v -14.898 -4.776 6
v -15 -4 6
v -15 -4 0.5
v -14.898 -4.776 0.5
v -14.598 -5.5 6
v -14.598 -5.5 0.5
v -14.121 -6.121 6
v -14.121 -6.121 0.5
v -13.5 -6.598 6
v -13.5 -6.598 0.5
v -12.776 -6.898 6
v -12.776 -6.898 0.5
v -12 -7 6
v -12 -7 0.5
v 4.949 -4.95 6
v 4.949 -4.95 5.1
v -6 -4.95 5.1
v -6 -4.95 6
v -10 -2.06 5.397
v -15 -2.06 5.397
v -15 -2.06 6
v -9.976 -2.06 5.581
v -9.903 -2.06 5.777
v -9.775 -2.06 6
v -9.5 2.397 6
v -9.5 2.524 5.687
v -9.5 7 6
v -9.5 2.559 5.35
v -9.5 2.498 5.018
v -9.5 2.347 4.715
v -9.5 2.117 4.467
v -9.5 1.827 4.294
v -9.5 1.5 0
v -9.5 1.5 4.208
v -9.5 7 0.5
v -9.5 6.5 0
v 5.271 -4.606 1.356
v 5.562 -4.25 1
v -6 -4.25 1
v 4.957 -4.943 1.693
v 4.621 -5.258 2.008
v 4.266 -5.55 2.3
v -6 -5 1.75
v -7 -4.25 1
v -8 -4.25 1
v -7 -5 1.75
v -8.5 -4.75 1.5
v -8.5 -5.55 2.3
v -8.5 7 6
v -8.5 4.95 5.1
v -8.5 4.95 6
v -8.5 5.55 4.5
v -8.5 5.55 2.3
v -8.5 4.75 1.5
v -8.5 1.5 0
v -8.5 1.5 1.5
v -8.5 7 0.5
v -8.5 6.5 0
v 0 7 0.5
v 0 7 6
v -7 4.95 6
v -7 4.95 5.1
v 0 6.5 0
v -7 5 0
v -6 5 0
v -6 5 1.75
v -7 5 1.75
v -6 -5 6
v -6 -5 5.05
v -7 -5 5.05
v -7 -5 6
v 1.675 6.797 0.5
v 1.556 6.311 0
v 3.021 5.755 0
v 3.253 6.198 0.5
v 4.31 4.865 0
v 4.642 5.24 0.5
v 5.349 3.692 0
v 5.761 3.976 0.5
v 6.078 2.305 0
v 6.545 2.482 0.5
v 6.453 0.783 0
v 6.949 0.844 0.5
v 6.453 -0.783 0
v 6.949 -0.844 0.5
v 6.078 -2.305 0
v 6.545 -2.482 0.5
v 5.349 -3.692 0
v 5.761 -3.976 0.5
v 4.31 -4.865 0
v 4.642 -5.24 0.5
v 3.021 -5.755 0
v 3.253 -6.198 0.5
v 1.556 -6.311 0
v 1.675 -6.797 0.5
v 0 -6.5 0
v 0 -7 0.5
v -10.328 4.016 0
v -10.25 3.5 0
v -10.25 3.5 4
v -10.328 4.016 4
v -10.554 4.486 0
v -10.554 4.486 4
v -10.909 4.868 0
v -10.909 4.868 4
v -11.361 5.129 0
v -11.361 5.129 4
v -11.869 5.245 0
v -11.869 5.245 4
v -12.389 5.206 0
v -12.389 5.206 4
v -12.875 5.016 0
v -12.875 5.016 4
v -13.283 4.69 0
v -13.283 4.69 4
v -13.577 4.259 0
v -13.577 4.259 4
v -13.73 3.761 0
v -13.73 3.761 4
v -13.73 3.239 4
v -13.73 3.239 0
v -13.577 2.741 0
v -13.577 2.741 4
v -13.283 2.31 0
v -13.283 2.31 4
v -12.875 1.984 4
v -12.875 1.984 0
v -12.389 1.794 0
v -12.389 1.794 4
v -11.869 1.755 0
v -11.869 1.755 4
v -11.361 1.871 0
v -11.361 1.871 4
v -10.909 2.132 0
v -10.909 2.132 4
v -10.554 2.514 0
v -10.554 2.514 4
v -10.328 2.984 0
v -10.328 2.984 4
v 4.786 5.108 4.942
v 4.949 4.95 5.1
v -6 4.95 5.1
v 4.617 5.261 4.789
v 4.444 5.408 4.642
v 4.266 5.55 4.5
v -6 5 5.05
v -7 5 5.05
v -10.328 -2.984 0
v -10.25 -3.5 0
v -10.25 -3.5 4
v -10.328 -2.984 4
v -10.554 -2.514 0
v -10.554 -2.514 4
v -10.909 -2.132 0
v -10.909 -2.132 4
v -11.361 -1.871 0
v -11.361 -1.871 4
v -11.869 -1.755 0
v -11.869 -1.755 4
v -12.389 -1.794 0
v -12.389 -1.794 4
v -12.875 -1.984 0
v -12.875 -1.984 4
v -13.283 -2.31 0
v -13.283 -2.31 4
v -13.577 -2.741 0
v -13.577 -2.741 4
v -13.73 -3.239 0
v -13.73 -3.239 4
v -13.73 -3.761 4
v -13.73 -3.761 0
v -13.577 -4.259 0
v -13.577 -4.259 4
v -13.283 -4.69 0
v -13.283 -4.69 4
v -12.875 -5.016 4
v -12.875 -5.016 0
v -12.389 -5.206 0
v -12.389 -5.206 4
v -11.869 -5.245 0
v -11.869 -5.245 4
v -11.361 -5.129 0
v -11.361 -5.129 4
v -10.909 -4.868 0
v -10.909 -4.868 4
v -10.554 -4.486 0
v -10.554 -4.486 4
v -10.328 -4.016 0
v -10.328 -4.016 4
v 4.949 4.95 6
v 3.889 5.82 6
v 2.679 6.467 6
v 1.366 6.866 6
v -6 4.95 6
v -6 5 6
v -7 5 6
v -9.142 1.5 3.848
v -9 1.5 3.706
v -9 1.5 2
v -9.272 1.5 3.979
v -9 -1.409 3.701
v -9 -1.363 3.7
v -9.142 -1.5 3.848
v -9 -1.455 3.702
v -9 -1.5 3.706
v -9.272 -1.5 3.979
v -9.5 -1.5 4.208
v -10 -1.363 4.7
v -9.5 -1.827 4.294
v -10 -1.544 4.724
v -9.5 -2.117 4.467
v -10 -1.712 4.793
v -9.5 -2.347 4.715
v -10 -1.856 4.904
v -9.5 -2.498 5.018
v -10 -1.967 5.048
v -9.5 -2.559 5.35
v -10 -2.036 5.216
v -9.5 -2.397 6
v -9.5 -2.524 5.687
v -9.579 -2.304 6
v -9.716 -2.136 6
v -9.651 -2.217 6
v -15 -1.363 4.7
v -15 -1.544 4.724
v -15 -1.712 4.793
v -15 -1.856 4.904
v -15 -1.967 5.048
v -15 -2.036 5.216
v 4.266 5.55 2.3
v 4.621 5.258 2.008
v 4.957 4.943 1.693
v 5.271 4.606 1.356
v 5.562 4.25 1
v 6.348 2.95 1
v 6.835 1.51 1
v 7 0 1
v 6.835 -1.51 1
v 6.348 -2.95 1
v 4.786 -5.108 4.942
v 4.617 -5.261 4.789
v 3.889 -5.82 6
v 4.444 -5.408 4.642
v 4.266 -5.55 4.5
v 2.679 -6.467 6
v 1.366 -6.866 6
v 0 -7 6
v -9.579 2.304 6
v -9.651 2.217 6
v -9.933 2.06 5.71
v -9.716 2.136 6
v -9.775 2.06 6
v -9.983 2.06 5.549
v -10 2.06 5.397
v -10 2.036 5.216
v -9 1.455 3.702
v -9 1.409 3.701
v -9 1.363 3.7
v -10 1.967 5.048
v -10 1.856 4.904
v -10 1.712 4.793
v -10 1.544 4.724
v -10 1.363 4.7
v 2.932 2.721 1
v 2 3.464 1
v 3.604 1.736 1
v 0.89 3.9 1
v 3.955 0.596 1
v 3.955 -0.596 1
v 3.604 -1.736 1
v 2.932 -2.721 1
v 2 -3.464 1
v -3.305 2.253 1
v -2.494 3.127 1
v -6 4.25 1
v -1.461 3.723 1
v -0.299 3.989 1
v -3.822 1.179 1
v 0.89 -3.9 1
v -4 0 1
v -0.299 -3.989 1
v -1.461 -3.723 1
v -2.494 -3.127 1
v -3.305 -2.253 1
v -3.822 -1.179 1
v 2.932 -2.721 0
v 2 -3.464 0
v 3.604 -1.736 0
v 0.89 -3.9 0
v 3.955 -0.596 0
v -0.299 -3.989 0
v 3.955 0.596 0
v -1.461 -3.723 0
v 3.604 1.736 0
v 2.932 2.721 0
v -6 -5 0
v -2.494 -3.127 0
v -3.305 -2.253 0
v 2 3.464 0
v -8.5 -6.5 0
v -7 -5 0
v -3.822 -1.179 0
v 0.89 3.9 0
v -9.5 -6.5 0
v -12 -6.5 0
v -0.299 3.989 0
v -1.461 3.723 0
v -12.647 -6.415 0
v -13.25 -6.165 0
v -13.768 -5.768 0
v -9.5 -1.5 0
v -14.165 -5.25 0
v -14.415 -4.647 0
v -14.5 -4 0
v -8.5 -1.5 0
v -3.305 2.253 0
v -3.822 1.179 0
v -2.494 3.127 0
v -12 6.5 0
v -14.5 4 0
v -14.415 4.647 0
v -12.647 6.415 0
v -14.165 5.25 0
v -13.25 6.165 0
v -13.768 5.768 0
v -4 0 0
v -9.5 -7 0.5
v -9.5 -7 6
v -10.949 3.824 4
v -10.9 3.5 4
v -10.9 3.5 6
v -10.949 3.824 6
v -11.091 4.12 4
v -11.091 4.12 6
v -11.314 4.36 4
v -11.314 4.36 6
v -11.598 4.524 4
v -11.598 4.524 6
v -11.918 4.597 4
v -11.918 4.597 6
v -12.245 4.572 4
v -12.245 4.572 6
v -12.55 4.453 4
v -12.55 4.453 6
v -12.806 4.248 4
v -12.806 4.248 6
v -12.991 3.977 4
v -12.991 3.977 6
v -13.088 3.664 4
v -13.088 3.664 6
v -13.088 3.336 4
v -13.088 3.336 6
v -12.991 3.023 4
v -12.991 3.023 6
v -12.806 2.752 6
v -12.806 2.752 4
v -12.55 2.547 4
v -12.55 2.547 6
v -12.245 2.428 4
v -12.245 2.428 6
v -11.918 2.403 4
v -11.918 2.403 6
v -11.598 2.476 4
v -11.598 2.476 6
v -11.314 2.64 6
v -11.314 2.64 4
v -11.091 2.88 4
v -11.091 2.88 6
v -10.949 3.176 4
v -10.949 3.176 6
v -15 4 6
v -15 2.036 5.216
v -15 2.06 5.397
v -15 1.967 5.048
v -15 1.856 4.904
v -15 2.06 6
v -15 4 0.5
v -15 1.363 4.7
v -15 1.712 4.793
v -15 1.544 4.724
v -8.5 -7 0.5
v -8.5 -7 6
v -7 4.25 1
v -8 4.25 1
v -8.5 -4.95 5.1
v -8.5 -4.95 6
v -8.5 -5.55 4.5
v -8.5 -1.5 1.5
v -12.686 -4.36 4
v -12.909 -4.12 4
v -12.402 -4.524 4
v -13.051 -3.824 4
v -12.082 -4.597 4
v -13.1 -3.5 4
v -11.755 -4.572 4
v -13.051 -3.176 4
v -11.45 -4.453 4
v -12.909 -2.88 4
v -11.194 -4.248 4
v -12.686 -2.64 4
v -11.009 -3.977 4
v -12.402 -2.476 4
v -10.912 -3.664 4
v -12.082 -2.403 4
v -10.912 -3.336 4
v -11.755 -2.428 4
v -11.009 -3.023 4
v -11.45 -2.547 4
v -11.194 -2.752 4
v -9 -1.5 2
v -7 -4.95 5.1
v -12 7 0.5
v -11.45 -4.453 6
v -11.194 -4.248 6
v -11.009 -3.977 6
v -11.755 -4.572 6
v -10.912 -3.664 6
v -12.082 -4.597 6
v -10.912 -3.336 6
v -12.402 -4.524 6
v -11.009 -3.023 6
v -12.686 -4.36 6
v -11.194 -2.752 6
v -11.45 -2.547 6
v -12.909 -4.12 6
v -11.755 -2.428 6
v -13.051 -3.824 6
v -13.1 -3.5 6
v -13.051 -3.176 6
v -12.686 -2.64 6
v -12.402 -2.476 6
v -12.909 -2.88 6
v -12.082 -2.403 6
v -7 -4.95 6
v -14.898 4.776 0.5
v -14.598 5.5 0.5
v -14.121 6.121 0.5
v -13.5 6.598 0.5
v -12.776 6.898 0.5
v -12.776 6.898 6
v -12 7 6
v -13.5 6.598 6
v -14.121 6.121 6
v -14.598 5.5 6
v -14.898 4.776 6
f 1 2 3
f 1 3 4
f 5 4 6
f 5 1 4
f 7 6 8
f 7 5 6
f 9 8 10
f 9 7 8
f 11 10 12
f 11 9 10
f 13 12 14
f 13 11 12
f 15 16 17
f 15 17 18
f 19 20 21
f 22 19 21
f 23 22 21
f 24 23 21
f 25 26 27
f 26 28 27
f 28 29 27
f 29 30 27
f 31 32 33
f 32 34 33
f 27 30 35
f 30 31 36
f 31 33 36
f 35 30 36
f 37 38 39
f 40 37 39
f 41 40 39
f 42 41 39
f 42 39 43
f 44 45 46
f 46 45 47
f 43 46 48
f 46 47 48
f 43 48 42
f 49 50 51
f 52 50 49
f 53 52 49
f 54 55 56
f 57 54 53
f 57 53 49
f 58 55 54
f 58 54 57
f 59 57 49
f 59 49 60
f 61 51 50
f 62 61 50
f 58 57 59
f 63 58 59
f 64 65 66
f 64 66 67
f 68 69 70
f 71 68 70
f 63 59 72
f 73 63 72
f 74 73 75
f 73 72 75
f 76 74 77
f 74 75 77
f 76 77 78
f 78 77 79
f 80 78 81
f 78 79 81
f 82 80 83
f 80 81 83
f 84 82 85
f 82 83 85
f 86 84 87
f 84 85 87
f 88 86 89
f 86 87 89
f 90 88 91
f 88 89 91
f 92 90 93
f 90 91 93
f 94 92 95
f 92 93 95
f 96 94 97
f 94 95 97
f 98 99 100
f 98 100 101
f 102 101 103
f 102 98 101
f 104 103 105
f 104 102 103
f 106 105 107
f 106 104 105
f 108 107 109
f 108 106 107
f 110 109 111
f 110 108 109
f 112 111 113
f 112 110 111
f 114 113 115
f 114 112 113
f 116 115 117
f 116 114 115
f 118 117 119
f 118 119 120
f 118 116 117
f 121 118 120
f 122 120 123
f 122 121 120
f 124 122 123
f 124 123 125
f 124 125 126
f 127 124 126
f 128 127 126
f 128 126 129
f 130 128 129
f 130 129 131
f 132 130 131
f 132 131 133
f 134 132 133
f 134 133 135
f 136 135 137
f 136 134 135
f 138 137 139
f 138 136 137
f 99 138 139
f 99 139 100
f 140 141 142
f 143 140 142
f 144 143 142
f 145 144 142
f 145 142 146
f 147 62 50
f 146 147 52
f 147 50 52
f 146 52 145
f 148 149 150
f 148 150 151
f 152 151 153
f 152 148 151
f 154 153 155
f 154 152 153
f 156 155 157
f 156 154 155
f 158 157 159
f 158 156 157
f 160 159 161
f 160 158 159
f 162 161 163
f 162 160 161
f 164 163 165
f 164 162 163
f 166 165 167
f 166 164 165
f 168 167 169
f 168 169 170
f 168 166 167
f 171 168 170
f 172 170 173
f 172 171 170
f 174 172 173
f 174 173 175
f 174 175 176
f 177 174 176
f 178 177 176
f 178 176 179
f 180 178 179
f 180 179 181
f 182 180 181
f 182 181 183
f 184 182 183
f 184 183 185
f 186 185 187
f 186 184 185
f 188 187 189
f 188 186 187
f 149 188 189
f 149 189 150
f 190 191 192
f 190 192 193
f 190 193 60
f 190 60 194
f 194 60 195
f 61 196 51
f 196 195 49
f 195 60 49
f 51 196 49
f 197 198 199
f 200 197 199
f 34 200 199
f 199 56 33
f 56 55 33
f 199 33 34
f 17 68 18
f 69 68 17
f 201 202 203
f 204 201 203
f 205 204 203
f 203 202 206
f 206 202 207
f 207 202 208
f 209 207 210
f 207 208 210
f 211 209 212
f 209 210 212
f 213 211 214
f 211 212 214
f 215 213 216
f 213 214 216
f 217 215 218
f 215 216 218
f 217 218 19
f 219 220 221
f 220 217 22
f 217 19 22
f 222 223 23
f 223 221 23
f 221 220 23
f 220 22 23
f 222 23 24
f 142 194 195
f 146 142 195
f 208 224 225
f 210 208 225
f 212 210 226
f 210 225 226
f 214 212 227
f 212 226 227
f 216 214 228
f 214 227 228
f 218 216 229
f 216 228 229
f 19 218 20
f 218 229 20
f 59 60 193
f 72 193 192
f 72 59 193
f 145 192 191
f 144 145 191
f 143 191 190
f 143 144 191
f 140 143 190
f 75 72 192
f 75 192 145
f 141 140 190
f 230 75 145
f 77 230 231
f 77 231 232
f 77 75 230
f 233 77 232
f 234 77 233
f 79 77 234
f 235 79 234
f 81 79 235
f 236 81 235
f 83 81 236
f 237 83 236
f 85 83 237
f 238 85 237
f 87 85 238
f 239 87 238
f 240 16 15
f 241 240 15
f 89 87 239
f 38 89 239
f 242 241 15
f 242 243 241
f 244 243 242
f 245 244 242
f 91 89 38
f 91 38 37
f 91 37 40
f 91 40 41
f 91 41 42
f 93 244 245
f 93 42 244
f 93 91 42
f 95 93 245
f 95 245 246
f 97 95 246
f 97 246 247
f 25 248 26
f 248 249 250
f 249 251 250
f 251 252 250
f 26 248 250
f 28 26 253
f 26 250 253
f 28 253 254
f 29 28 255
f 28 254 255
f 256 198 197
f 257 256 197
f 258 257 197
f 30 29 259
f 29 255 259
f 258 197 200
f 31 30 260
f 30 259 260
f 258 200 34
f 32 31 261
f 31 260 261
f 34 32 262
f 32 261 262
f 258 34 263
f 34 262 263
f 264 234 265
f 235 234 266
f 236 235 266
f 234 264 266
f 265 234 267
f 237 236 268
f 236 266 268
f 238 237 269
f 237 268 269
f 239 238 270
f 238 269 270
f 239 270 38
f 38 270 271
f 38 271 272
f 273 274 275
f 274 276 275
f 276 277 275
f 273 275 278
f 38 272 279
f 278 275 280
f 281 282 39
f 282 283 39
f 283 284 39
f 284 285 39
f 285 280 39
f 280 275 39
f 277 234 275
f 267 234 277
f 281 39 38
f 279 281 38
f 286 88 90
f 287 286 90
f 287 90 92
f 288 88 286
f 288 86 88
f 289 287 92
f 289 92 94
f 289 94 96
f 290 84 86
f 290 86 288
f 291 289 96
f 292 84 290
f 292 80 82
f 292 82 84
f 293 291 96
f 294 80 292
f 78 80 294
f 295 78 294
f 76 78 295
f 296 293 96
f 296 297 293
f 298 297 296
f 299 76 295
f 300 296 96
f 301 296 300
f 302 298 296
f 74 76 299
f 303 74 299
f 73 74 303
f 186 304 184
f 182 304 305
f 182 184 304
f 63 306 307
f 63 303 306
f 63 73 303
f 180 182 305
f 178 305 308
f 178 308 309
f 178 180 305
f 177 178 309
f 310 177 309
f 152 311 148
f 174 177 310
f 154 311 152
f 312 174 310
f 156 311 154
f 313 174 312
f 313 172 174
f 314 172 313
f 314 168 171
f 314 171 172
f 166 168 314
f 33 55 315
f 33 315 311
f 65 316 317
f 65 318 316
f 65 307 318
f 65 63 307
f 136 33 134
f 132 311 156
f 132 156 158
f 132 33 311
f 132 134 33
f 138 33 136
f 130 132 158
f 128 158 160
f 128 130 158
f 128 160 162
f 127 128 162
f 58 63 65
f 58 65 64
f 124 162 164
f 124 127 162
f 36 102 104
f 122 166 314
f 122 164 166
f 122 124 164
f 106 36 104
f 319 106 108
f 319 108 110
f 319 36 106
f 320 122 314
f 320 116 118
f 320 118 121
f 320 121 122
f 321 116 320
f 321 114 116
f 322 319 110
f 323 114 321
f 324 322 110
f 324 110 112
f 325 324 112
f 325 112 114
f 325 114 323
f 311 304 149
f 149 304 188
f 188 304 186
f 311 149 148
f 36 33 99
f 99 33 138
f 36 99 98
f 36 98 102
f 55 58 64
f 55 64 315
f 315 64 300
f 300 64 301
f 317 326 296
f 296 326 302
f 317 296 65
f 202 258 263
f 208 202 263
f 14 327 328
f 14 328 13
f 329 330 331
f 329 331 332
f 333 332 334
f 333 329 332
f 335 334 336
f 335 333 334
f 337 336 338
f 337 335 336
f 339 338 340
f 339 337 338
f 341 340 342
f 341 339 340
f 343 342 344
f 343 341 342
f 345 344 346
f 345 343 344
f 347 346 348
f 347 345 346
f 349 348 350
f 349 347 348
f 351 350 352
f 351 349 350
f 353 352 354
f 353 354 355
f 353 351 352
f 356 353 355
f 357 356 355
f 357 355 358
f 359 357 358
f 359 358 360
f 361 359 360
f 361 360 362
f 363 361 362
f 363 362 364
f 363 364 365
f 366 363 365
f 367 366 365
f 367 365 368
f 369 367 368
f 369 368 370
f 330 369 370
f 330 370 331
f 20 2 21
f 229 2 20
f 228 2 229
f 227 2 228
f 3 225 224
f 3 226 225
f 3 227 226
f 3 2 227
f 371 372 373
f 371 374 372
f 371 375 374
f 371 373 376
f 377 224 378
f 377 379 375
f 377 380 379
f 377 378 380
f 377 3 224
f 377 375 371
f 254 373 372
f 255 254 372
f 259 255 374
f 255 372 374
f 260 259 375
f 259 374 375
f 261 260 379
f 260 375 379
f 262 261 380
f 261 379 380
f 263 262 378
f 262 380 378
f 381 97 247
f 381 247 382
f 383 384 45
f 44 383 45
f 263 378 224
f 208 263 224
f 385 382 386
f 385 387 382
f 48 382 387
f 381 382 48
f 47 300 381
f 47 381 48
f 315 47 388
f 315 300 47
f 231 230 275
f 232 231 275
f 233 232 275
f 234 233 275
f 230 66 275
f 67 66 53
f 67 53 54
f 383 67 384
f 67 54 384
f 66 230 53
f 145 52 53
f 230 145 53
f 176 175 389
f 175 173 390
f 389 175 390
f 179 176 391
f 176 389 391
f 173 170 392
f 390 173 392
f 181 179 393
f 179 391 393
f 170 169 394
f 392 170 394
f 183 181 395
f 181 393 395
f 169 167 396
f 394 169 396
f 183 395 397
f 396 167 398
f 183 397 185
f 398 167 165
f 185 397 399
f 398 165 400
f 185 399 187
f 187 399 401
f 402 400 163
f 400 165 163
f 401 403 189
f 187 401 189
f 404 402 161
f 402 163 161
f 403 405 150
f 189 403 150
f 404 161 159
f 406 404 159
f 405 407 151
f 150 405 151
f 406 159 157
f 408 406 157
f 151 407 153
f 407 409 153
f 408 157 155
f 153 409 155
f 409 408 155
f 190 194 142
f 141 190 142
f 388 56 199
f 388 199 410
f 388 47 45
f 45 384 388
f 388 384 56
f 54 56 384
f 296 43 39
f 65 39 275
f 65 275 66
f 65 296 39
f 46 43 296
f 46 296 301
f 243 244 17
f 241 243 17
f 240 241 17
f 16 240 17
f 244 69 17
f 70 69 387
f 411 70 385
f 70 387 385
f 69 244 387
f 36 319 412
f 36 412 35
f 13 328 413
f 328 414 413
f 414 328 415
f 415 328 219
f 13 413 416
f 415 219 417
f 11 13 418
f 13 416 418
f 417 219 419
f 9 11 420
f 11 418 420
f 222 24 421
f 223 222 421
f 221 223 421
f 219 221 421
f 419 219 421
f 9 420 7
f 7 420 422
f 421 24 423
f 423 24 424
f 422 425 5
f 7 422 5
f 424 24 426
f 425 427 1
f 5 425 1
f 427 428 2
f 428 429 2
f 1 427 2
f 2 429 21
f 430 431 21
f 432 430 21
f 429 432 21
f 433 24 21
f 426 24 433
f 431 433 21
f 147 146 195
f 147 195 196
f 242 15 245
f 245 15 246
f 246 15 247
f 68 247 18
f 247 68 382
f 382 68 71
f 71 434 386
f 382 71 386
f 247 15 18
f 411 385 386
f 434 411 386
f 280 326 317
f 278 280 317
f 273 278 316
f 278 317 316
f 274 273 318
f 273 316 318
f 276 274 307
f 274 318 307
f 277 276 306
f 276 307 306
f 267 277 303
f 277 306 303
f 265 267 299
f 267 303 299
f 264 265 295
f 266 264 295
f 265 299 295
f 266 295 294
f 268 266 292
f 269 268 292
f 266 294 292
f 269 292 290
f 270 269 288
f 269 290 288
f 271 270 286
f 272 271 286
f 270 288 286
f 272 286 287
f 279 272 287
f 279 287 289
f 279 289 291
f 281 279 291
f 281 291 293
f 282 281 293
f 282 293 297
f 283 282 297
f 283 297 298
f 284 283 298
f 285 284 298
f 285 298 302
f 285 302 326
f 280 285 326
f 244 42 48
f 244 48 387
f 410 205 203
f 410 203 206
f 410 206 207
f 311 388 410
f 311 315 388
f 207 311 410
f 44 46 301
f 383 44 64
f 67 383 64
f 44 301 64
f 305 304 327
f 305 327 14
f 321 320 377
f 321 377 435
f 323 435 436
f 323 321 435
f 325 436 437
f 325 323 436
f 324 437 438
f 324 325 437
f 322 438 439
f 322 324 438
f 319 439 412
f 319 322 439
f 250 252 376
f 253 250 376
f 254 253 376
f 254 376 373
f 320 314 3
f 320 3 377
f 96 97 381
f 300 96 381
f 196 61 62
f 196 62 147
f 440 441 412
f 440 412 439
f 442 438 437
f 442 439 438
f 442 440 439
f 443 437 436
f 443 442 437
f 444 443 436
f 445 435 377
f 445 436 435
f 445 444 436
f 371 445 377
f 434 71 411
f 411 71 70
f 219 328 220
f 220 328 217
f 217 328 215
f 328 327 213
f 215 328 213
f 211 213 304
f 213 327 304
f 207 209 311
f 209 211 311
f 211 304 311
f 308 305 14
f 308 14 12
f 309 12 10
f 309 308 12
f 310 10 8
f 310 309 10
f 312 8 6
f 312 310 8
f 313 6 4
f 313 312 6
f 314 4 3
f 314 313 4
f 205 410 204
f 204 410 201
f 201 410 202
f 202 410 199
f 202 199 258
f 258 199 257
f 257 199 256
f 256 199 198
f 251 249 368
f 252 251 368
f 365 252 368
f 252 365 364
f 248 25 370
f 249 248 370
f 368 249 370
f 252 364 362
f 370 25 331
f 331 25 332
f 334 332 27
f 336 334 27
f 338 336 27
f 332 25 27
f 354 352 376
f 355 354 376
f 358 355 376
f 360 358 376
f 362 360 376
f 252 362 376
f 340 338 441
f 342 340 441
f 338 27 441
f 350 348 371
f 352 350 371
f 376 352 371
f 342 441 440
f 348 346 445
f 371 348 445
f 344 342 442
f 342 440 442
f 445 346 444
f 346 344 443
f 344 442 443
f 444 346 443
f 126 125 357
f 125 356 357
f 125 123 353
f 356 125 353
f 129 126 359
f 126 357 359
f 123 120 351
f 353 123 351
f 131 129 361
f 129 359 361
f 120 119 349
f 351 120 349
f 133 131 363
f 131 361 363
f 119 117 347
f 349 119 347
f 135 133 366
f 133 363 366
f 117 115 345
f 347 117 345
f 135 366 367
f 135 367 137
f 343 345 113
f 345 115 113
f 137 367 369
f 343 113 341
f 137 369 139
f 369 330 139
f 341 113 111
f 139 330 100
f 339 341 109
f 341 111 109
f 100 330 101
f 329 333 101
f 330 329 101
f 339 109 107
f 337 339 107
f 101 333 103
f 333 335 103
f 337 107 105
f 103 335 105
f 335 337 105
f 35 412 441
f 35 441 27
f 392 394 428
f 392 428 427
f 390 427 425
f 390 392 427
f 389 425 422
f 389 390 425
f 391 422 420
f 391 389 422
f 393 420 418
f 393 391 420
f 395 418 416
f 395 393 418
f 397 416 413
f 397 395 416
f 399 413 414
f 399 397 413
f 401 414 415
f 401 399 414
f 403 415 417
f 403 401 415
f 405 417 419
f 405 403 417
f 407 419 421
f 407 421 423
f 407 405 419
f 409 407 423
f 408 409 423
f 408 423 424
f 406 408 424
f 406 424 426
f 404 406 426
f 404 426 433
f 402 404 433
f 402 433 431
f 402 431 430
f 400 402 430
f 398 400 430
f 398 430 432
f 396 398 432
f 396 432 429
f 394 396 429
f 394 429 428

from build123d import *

# Parameters (mm, degrees)
SKETCH1_R             = 1.1
BOSS_EXTRUDE1_DEPTH   = 6
SKETCH2_R             = 4
CUT_EXTRUDE2_DEPTH    = 10
CUT_EXTRUDE4_START    = -6
CUT_EXTRUDE4_DEPTH    = 18.853720884
CUT_EXTRUDE6_DEPTH    = 24.853720884
CROQUIS1_W            = 1
CROQUIS1_H            = 5.5
CROQUIS1_H_2          = 10
CORTAR_EXTRUIR1_DEPTH = 18.606816862
FILLET4_R             = 3
FILLET1_SIZE          = 0.5
SKETCH5_R             = 1.75
CUT_EXTRUDE5_DEPTH    = 4
CHAFL_N1_SIZE         = 1


with BuildPart() as part:
    # Sketch1 → Boss-Extrude1 (new body)
    with BuildSketch(Plane.XY):
        with BuildLine():
            Line((-15, 7), (0, 7))
            ThreePointArc((0, 7), (7, 0), (0, -7))
            Line((0, -7), (-15, -7))
            Line((-15, -7), (-15, 7))
        make_face()
        with Locations((-12, 3.5)):
            Circle(SKETCH1_R, mode=Mode.SUBTRACT)
        with Locations(Location((-12, -3.5, 0), (0, 0, 180))):
            Circle(SKETCH1_R, mode=Mode.SUBTRACT)
    extrude(amount=BOSS_EXTRUDE1_DEPTH)

    # Sketch2 → Cut-Extrude2 (cut)
    with BuildSketch(Plane(origin=(0, 0, 0), x_dir=(-1, 0, 0), z_dir=(0, 0, -1))):
        Circle(SKETCH2_R)
    extrude(amount=-CUT_EXTRUDE2_DEPTH, mode=Mode.SUBTRACT)

    # Sketch7 → Cut-Extrude4 (cut, through all)
    with BuildSketch(Plane.ZY.offset(15).offset(CUT_EXTRUDE4_START)):
        Polygon((2.3, 5.55), (1, 4.25), (1, -4.25), (2.3, -5.55), (4.5, -5.55), (5.1, -4.95), (6, -4.95), (6, 4.95), (5.1, 4.95), (4.5, 5.55), align=None)
    extrude(amount=-CUT_EXTRUDE4_DEPTH, mode=Mode.SUBTRACT)

    # Sketch8 → Cut-Extrude6 (cut, through all)
    with BuildSketch(Plane.ZY.offset(15)):
        with BuildLine():
            Line((4.7, 1.363340016), (4.7, -1.363340016))
            ThreePointArc((4.7, -1.363340016), (4.904046985, -1.855953015), (5.396659984, -2.06))
            Line((5.396659984, -2.06), (6, -2.06))
            Line((6, -2.06), (6, 2.06))
            Line((6, 2.06), (5.396659984, 2.06))
            ThreePointArc((5.396659984, 2.06), (4.904046985, 1.855953015), (4.7, 1.363340016))
        make_face()
    extrude(amount=-CUT_EXTRUDE6_DEPTH, mode=Mode.SUBTRACT)

    # Croquis1 → Cortar-Extruir1 (cut, through all)
    with BuildSketch(Plane(origin=(0, 0, 0), x_dir=(-1, 0, 0), z_dir=(0, 0, -1))):
        with Locations((9, 4.25)):
            Rectangle(CROQUIS1_W, CROQUIS1_H)
        with Locations((6.5, 0)):
            Rectangle(CROQUIS1_W, CROQUIS1_H_2)
        with Locations((9, -4.25)):
            Rectangle(CROQUIS1_W, CROQUIS1_H)
    extrude(amount=-CORTAR_EXTRUIR1_DEPTH, mode=Mode.SUBTRACT)

    # Fillet4
    fillet4_edges = [part.edges().sort_by_distance(p)[0] for p in [
        (-15, -7, 3),
        (-15, 7, 3),
    ]]
    fillet(fillet4_edges, radius=FILLET4_R)

    # Fillet1
    fillet1_edges = [part.edges().sort_by_distance(p)[0] for p in [
        (-4.25, -7, 0),
        (-10.75, 7, 0),
        (-15, 0, 0),
        (-10.75, -7, 0),
        (-14.121320344, -6.121320344, 0),
        (-14.121320344, 6.121320344, 0),
        (-4.25, 7, 0),
        (7, 0, 0),
    ]]
    chamfer(fillet1_edges, length=FILLET1_SIZE)

    # Sketch5 → Cut-Extrude5 (cut)
    with BuildSketch(Plane.XY):
        with Locations((-12, 3.5)):
            Circle(SKETCH5_R)
        with Locations((-12, -3.5)):
            Circle(SKETCH5_R)
    extrude(amount=CUT_EXTRUDE5_DEPTH, mode=Mode.SUBTRACT)

    # Chaflán1
    chafl_n1_edges = [part.edges().sort_by_distance(p)[0] for p in [
        (-9, 0, 1),
    ]]
    chamfer(chafl_n1_edges, length=CHAFL_N1_SIZE)
    # the kernel refuses this chamfer: 1 mm, written as the material it takes off along each edge
    with BuildSketch(Plane(origin=(-9, 1.363340016, 4.7), x_dir=(0, 0, -1), z_dir=(0, -1, 0))) as chafl_n1_2_piece_1:
        with BuildLine():
            Line((1.028284271, 0.028284271), (-0.028284271, -1.028284271))
            Line((-0.028284271, -1.028284271), (-0.048284271, -1.028284271))
            ThreePointArc((-0.048284271, -1.028284271), (-0.02, -0.514142136), (-0.02, 0))
            Line((-0.02, 0), (0, 0.02))
            ThreePointArc((0, 0.02), (0.514142136, 0.02), (1.028284271, 0.048284271))
            Line((1.028284271, 0.048284271), (1.028284271, 0.028284271))
        make_face()
    extrude(amount=2.726680031, mode=Mode.SUBTRACT)
    with BuildSketch(Plane(origin=(-9, 1.363340016, 5.396659984), x_dir=(0, -0.6796769184207155, 0.7335116131092404), z_dir=(0, -0.7335116131092404, -0.6796769184207155))) as chafl_n1_2_piece_2:
        with BuildLine():
            Line((1.724944256, -0.028284271), (0.668375713, 1.028284271))
            Line((0.668375713, 1.028284271), (0.648375713, 1.028284271))
            ThreePointArc((0.648375713, 1.028284271), (0.676659984, 0.514142136), (0.676659984, 0))
            Line((0.676659984, 0), (0.696659984, -0.02))
            ThreePointArc((0.696659984, -0.02), (1.21080212, -0.02), (1.724944256, -0.048284271))
            Line((1.724944256, -0.048284271), (1.724944256, -0.028284271))
        make_face()
    revolve(axis=Axis((-9, 1.363340016, 5.396659984), (-1, 0, 0)), revolution_arc=222.818401466, mode=Mode.SUBTRACT)
    with BuildSketch(Plane(origin=(-9, -1.363340016, 5.396659984), x_dir=(0, 0, -1), z_dir=(0, 1, 0))) as chafl_n1_2_piece_3:
        with BuildLine():
            Line((1.724944256, -0.028284271), (0.668375713, 1.028284271))
            Line((0.668375713, 1.028284271), (0.648375713, 1.028284271))
            ThreePointArc((0.648375713, 1.028284271), (0.676659984, 0.514142136), (0.676659984, 0))
            Line((0.676659984, 0), (0.696659984, -0.02))
            ThreePointArc((0.696659984, -0.02), (1.21080212, -0.02), (1.724944256, -0.048284271))
            Line((1.724944256, -0.048284271), (1.724944256, -0.028284271))
        make_face()
    revolve(axis=Axis((-9, -1.363340016, 5.396659984), (-1, 0, 0)), revolution_arc=222.818401466, mode=Mode.SUBTRACT)


solid = part.part
